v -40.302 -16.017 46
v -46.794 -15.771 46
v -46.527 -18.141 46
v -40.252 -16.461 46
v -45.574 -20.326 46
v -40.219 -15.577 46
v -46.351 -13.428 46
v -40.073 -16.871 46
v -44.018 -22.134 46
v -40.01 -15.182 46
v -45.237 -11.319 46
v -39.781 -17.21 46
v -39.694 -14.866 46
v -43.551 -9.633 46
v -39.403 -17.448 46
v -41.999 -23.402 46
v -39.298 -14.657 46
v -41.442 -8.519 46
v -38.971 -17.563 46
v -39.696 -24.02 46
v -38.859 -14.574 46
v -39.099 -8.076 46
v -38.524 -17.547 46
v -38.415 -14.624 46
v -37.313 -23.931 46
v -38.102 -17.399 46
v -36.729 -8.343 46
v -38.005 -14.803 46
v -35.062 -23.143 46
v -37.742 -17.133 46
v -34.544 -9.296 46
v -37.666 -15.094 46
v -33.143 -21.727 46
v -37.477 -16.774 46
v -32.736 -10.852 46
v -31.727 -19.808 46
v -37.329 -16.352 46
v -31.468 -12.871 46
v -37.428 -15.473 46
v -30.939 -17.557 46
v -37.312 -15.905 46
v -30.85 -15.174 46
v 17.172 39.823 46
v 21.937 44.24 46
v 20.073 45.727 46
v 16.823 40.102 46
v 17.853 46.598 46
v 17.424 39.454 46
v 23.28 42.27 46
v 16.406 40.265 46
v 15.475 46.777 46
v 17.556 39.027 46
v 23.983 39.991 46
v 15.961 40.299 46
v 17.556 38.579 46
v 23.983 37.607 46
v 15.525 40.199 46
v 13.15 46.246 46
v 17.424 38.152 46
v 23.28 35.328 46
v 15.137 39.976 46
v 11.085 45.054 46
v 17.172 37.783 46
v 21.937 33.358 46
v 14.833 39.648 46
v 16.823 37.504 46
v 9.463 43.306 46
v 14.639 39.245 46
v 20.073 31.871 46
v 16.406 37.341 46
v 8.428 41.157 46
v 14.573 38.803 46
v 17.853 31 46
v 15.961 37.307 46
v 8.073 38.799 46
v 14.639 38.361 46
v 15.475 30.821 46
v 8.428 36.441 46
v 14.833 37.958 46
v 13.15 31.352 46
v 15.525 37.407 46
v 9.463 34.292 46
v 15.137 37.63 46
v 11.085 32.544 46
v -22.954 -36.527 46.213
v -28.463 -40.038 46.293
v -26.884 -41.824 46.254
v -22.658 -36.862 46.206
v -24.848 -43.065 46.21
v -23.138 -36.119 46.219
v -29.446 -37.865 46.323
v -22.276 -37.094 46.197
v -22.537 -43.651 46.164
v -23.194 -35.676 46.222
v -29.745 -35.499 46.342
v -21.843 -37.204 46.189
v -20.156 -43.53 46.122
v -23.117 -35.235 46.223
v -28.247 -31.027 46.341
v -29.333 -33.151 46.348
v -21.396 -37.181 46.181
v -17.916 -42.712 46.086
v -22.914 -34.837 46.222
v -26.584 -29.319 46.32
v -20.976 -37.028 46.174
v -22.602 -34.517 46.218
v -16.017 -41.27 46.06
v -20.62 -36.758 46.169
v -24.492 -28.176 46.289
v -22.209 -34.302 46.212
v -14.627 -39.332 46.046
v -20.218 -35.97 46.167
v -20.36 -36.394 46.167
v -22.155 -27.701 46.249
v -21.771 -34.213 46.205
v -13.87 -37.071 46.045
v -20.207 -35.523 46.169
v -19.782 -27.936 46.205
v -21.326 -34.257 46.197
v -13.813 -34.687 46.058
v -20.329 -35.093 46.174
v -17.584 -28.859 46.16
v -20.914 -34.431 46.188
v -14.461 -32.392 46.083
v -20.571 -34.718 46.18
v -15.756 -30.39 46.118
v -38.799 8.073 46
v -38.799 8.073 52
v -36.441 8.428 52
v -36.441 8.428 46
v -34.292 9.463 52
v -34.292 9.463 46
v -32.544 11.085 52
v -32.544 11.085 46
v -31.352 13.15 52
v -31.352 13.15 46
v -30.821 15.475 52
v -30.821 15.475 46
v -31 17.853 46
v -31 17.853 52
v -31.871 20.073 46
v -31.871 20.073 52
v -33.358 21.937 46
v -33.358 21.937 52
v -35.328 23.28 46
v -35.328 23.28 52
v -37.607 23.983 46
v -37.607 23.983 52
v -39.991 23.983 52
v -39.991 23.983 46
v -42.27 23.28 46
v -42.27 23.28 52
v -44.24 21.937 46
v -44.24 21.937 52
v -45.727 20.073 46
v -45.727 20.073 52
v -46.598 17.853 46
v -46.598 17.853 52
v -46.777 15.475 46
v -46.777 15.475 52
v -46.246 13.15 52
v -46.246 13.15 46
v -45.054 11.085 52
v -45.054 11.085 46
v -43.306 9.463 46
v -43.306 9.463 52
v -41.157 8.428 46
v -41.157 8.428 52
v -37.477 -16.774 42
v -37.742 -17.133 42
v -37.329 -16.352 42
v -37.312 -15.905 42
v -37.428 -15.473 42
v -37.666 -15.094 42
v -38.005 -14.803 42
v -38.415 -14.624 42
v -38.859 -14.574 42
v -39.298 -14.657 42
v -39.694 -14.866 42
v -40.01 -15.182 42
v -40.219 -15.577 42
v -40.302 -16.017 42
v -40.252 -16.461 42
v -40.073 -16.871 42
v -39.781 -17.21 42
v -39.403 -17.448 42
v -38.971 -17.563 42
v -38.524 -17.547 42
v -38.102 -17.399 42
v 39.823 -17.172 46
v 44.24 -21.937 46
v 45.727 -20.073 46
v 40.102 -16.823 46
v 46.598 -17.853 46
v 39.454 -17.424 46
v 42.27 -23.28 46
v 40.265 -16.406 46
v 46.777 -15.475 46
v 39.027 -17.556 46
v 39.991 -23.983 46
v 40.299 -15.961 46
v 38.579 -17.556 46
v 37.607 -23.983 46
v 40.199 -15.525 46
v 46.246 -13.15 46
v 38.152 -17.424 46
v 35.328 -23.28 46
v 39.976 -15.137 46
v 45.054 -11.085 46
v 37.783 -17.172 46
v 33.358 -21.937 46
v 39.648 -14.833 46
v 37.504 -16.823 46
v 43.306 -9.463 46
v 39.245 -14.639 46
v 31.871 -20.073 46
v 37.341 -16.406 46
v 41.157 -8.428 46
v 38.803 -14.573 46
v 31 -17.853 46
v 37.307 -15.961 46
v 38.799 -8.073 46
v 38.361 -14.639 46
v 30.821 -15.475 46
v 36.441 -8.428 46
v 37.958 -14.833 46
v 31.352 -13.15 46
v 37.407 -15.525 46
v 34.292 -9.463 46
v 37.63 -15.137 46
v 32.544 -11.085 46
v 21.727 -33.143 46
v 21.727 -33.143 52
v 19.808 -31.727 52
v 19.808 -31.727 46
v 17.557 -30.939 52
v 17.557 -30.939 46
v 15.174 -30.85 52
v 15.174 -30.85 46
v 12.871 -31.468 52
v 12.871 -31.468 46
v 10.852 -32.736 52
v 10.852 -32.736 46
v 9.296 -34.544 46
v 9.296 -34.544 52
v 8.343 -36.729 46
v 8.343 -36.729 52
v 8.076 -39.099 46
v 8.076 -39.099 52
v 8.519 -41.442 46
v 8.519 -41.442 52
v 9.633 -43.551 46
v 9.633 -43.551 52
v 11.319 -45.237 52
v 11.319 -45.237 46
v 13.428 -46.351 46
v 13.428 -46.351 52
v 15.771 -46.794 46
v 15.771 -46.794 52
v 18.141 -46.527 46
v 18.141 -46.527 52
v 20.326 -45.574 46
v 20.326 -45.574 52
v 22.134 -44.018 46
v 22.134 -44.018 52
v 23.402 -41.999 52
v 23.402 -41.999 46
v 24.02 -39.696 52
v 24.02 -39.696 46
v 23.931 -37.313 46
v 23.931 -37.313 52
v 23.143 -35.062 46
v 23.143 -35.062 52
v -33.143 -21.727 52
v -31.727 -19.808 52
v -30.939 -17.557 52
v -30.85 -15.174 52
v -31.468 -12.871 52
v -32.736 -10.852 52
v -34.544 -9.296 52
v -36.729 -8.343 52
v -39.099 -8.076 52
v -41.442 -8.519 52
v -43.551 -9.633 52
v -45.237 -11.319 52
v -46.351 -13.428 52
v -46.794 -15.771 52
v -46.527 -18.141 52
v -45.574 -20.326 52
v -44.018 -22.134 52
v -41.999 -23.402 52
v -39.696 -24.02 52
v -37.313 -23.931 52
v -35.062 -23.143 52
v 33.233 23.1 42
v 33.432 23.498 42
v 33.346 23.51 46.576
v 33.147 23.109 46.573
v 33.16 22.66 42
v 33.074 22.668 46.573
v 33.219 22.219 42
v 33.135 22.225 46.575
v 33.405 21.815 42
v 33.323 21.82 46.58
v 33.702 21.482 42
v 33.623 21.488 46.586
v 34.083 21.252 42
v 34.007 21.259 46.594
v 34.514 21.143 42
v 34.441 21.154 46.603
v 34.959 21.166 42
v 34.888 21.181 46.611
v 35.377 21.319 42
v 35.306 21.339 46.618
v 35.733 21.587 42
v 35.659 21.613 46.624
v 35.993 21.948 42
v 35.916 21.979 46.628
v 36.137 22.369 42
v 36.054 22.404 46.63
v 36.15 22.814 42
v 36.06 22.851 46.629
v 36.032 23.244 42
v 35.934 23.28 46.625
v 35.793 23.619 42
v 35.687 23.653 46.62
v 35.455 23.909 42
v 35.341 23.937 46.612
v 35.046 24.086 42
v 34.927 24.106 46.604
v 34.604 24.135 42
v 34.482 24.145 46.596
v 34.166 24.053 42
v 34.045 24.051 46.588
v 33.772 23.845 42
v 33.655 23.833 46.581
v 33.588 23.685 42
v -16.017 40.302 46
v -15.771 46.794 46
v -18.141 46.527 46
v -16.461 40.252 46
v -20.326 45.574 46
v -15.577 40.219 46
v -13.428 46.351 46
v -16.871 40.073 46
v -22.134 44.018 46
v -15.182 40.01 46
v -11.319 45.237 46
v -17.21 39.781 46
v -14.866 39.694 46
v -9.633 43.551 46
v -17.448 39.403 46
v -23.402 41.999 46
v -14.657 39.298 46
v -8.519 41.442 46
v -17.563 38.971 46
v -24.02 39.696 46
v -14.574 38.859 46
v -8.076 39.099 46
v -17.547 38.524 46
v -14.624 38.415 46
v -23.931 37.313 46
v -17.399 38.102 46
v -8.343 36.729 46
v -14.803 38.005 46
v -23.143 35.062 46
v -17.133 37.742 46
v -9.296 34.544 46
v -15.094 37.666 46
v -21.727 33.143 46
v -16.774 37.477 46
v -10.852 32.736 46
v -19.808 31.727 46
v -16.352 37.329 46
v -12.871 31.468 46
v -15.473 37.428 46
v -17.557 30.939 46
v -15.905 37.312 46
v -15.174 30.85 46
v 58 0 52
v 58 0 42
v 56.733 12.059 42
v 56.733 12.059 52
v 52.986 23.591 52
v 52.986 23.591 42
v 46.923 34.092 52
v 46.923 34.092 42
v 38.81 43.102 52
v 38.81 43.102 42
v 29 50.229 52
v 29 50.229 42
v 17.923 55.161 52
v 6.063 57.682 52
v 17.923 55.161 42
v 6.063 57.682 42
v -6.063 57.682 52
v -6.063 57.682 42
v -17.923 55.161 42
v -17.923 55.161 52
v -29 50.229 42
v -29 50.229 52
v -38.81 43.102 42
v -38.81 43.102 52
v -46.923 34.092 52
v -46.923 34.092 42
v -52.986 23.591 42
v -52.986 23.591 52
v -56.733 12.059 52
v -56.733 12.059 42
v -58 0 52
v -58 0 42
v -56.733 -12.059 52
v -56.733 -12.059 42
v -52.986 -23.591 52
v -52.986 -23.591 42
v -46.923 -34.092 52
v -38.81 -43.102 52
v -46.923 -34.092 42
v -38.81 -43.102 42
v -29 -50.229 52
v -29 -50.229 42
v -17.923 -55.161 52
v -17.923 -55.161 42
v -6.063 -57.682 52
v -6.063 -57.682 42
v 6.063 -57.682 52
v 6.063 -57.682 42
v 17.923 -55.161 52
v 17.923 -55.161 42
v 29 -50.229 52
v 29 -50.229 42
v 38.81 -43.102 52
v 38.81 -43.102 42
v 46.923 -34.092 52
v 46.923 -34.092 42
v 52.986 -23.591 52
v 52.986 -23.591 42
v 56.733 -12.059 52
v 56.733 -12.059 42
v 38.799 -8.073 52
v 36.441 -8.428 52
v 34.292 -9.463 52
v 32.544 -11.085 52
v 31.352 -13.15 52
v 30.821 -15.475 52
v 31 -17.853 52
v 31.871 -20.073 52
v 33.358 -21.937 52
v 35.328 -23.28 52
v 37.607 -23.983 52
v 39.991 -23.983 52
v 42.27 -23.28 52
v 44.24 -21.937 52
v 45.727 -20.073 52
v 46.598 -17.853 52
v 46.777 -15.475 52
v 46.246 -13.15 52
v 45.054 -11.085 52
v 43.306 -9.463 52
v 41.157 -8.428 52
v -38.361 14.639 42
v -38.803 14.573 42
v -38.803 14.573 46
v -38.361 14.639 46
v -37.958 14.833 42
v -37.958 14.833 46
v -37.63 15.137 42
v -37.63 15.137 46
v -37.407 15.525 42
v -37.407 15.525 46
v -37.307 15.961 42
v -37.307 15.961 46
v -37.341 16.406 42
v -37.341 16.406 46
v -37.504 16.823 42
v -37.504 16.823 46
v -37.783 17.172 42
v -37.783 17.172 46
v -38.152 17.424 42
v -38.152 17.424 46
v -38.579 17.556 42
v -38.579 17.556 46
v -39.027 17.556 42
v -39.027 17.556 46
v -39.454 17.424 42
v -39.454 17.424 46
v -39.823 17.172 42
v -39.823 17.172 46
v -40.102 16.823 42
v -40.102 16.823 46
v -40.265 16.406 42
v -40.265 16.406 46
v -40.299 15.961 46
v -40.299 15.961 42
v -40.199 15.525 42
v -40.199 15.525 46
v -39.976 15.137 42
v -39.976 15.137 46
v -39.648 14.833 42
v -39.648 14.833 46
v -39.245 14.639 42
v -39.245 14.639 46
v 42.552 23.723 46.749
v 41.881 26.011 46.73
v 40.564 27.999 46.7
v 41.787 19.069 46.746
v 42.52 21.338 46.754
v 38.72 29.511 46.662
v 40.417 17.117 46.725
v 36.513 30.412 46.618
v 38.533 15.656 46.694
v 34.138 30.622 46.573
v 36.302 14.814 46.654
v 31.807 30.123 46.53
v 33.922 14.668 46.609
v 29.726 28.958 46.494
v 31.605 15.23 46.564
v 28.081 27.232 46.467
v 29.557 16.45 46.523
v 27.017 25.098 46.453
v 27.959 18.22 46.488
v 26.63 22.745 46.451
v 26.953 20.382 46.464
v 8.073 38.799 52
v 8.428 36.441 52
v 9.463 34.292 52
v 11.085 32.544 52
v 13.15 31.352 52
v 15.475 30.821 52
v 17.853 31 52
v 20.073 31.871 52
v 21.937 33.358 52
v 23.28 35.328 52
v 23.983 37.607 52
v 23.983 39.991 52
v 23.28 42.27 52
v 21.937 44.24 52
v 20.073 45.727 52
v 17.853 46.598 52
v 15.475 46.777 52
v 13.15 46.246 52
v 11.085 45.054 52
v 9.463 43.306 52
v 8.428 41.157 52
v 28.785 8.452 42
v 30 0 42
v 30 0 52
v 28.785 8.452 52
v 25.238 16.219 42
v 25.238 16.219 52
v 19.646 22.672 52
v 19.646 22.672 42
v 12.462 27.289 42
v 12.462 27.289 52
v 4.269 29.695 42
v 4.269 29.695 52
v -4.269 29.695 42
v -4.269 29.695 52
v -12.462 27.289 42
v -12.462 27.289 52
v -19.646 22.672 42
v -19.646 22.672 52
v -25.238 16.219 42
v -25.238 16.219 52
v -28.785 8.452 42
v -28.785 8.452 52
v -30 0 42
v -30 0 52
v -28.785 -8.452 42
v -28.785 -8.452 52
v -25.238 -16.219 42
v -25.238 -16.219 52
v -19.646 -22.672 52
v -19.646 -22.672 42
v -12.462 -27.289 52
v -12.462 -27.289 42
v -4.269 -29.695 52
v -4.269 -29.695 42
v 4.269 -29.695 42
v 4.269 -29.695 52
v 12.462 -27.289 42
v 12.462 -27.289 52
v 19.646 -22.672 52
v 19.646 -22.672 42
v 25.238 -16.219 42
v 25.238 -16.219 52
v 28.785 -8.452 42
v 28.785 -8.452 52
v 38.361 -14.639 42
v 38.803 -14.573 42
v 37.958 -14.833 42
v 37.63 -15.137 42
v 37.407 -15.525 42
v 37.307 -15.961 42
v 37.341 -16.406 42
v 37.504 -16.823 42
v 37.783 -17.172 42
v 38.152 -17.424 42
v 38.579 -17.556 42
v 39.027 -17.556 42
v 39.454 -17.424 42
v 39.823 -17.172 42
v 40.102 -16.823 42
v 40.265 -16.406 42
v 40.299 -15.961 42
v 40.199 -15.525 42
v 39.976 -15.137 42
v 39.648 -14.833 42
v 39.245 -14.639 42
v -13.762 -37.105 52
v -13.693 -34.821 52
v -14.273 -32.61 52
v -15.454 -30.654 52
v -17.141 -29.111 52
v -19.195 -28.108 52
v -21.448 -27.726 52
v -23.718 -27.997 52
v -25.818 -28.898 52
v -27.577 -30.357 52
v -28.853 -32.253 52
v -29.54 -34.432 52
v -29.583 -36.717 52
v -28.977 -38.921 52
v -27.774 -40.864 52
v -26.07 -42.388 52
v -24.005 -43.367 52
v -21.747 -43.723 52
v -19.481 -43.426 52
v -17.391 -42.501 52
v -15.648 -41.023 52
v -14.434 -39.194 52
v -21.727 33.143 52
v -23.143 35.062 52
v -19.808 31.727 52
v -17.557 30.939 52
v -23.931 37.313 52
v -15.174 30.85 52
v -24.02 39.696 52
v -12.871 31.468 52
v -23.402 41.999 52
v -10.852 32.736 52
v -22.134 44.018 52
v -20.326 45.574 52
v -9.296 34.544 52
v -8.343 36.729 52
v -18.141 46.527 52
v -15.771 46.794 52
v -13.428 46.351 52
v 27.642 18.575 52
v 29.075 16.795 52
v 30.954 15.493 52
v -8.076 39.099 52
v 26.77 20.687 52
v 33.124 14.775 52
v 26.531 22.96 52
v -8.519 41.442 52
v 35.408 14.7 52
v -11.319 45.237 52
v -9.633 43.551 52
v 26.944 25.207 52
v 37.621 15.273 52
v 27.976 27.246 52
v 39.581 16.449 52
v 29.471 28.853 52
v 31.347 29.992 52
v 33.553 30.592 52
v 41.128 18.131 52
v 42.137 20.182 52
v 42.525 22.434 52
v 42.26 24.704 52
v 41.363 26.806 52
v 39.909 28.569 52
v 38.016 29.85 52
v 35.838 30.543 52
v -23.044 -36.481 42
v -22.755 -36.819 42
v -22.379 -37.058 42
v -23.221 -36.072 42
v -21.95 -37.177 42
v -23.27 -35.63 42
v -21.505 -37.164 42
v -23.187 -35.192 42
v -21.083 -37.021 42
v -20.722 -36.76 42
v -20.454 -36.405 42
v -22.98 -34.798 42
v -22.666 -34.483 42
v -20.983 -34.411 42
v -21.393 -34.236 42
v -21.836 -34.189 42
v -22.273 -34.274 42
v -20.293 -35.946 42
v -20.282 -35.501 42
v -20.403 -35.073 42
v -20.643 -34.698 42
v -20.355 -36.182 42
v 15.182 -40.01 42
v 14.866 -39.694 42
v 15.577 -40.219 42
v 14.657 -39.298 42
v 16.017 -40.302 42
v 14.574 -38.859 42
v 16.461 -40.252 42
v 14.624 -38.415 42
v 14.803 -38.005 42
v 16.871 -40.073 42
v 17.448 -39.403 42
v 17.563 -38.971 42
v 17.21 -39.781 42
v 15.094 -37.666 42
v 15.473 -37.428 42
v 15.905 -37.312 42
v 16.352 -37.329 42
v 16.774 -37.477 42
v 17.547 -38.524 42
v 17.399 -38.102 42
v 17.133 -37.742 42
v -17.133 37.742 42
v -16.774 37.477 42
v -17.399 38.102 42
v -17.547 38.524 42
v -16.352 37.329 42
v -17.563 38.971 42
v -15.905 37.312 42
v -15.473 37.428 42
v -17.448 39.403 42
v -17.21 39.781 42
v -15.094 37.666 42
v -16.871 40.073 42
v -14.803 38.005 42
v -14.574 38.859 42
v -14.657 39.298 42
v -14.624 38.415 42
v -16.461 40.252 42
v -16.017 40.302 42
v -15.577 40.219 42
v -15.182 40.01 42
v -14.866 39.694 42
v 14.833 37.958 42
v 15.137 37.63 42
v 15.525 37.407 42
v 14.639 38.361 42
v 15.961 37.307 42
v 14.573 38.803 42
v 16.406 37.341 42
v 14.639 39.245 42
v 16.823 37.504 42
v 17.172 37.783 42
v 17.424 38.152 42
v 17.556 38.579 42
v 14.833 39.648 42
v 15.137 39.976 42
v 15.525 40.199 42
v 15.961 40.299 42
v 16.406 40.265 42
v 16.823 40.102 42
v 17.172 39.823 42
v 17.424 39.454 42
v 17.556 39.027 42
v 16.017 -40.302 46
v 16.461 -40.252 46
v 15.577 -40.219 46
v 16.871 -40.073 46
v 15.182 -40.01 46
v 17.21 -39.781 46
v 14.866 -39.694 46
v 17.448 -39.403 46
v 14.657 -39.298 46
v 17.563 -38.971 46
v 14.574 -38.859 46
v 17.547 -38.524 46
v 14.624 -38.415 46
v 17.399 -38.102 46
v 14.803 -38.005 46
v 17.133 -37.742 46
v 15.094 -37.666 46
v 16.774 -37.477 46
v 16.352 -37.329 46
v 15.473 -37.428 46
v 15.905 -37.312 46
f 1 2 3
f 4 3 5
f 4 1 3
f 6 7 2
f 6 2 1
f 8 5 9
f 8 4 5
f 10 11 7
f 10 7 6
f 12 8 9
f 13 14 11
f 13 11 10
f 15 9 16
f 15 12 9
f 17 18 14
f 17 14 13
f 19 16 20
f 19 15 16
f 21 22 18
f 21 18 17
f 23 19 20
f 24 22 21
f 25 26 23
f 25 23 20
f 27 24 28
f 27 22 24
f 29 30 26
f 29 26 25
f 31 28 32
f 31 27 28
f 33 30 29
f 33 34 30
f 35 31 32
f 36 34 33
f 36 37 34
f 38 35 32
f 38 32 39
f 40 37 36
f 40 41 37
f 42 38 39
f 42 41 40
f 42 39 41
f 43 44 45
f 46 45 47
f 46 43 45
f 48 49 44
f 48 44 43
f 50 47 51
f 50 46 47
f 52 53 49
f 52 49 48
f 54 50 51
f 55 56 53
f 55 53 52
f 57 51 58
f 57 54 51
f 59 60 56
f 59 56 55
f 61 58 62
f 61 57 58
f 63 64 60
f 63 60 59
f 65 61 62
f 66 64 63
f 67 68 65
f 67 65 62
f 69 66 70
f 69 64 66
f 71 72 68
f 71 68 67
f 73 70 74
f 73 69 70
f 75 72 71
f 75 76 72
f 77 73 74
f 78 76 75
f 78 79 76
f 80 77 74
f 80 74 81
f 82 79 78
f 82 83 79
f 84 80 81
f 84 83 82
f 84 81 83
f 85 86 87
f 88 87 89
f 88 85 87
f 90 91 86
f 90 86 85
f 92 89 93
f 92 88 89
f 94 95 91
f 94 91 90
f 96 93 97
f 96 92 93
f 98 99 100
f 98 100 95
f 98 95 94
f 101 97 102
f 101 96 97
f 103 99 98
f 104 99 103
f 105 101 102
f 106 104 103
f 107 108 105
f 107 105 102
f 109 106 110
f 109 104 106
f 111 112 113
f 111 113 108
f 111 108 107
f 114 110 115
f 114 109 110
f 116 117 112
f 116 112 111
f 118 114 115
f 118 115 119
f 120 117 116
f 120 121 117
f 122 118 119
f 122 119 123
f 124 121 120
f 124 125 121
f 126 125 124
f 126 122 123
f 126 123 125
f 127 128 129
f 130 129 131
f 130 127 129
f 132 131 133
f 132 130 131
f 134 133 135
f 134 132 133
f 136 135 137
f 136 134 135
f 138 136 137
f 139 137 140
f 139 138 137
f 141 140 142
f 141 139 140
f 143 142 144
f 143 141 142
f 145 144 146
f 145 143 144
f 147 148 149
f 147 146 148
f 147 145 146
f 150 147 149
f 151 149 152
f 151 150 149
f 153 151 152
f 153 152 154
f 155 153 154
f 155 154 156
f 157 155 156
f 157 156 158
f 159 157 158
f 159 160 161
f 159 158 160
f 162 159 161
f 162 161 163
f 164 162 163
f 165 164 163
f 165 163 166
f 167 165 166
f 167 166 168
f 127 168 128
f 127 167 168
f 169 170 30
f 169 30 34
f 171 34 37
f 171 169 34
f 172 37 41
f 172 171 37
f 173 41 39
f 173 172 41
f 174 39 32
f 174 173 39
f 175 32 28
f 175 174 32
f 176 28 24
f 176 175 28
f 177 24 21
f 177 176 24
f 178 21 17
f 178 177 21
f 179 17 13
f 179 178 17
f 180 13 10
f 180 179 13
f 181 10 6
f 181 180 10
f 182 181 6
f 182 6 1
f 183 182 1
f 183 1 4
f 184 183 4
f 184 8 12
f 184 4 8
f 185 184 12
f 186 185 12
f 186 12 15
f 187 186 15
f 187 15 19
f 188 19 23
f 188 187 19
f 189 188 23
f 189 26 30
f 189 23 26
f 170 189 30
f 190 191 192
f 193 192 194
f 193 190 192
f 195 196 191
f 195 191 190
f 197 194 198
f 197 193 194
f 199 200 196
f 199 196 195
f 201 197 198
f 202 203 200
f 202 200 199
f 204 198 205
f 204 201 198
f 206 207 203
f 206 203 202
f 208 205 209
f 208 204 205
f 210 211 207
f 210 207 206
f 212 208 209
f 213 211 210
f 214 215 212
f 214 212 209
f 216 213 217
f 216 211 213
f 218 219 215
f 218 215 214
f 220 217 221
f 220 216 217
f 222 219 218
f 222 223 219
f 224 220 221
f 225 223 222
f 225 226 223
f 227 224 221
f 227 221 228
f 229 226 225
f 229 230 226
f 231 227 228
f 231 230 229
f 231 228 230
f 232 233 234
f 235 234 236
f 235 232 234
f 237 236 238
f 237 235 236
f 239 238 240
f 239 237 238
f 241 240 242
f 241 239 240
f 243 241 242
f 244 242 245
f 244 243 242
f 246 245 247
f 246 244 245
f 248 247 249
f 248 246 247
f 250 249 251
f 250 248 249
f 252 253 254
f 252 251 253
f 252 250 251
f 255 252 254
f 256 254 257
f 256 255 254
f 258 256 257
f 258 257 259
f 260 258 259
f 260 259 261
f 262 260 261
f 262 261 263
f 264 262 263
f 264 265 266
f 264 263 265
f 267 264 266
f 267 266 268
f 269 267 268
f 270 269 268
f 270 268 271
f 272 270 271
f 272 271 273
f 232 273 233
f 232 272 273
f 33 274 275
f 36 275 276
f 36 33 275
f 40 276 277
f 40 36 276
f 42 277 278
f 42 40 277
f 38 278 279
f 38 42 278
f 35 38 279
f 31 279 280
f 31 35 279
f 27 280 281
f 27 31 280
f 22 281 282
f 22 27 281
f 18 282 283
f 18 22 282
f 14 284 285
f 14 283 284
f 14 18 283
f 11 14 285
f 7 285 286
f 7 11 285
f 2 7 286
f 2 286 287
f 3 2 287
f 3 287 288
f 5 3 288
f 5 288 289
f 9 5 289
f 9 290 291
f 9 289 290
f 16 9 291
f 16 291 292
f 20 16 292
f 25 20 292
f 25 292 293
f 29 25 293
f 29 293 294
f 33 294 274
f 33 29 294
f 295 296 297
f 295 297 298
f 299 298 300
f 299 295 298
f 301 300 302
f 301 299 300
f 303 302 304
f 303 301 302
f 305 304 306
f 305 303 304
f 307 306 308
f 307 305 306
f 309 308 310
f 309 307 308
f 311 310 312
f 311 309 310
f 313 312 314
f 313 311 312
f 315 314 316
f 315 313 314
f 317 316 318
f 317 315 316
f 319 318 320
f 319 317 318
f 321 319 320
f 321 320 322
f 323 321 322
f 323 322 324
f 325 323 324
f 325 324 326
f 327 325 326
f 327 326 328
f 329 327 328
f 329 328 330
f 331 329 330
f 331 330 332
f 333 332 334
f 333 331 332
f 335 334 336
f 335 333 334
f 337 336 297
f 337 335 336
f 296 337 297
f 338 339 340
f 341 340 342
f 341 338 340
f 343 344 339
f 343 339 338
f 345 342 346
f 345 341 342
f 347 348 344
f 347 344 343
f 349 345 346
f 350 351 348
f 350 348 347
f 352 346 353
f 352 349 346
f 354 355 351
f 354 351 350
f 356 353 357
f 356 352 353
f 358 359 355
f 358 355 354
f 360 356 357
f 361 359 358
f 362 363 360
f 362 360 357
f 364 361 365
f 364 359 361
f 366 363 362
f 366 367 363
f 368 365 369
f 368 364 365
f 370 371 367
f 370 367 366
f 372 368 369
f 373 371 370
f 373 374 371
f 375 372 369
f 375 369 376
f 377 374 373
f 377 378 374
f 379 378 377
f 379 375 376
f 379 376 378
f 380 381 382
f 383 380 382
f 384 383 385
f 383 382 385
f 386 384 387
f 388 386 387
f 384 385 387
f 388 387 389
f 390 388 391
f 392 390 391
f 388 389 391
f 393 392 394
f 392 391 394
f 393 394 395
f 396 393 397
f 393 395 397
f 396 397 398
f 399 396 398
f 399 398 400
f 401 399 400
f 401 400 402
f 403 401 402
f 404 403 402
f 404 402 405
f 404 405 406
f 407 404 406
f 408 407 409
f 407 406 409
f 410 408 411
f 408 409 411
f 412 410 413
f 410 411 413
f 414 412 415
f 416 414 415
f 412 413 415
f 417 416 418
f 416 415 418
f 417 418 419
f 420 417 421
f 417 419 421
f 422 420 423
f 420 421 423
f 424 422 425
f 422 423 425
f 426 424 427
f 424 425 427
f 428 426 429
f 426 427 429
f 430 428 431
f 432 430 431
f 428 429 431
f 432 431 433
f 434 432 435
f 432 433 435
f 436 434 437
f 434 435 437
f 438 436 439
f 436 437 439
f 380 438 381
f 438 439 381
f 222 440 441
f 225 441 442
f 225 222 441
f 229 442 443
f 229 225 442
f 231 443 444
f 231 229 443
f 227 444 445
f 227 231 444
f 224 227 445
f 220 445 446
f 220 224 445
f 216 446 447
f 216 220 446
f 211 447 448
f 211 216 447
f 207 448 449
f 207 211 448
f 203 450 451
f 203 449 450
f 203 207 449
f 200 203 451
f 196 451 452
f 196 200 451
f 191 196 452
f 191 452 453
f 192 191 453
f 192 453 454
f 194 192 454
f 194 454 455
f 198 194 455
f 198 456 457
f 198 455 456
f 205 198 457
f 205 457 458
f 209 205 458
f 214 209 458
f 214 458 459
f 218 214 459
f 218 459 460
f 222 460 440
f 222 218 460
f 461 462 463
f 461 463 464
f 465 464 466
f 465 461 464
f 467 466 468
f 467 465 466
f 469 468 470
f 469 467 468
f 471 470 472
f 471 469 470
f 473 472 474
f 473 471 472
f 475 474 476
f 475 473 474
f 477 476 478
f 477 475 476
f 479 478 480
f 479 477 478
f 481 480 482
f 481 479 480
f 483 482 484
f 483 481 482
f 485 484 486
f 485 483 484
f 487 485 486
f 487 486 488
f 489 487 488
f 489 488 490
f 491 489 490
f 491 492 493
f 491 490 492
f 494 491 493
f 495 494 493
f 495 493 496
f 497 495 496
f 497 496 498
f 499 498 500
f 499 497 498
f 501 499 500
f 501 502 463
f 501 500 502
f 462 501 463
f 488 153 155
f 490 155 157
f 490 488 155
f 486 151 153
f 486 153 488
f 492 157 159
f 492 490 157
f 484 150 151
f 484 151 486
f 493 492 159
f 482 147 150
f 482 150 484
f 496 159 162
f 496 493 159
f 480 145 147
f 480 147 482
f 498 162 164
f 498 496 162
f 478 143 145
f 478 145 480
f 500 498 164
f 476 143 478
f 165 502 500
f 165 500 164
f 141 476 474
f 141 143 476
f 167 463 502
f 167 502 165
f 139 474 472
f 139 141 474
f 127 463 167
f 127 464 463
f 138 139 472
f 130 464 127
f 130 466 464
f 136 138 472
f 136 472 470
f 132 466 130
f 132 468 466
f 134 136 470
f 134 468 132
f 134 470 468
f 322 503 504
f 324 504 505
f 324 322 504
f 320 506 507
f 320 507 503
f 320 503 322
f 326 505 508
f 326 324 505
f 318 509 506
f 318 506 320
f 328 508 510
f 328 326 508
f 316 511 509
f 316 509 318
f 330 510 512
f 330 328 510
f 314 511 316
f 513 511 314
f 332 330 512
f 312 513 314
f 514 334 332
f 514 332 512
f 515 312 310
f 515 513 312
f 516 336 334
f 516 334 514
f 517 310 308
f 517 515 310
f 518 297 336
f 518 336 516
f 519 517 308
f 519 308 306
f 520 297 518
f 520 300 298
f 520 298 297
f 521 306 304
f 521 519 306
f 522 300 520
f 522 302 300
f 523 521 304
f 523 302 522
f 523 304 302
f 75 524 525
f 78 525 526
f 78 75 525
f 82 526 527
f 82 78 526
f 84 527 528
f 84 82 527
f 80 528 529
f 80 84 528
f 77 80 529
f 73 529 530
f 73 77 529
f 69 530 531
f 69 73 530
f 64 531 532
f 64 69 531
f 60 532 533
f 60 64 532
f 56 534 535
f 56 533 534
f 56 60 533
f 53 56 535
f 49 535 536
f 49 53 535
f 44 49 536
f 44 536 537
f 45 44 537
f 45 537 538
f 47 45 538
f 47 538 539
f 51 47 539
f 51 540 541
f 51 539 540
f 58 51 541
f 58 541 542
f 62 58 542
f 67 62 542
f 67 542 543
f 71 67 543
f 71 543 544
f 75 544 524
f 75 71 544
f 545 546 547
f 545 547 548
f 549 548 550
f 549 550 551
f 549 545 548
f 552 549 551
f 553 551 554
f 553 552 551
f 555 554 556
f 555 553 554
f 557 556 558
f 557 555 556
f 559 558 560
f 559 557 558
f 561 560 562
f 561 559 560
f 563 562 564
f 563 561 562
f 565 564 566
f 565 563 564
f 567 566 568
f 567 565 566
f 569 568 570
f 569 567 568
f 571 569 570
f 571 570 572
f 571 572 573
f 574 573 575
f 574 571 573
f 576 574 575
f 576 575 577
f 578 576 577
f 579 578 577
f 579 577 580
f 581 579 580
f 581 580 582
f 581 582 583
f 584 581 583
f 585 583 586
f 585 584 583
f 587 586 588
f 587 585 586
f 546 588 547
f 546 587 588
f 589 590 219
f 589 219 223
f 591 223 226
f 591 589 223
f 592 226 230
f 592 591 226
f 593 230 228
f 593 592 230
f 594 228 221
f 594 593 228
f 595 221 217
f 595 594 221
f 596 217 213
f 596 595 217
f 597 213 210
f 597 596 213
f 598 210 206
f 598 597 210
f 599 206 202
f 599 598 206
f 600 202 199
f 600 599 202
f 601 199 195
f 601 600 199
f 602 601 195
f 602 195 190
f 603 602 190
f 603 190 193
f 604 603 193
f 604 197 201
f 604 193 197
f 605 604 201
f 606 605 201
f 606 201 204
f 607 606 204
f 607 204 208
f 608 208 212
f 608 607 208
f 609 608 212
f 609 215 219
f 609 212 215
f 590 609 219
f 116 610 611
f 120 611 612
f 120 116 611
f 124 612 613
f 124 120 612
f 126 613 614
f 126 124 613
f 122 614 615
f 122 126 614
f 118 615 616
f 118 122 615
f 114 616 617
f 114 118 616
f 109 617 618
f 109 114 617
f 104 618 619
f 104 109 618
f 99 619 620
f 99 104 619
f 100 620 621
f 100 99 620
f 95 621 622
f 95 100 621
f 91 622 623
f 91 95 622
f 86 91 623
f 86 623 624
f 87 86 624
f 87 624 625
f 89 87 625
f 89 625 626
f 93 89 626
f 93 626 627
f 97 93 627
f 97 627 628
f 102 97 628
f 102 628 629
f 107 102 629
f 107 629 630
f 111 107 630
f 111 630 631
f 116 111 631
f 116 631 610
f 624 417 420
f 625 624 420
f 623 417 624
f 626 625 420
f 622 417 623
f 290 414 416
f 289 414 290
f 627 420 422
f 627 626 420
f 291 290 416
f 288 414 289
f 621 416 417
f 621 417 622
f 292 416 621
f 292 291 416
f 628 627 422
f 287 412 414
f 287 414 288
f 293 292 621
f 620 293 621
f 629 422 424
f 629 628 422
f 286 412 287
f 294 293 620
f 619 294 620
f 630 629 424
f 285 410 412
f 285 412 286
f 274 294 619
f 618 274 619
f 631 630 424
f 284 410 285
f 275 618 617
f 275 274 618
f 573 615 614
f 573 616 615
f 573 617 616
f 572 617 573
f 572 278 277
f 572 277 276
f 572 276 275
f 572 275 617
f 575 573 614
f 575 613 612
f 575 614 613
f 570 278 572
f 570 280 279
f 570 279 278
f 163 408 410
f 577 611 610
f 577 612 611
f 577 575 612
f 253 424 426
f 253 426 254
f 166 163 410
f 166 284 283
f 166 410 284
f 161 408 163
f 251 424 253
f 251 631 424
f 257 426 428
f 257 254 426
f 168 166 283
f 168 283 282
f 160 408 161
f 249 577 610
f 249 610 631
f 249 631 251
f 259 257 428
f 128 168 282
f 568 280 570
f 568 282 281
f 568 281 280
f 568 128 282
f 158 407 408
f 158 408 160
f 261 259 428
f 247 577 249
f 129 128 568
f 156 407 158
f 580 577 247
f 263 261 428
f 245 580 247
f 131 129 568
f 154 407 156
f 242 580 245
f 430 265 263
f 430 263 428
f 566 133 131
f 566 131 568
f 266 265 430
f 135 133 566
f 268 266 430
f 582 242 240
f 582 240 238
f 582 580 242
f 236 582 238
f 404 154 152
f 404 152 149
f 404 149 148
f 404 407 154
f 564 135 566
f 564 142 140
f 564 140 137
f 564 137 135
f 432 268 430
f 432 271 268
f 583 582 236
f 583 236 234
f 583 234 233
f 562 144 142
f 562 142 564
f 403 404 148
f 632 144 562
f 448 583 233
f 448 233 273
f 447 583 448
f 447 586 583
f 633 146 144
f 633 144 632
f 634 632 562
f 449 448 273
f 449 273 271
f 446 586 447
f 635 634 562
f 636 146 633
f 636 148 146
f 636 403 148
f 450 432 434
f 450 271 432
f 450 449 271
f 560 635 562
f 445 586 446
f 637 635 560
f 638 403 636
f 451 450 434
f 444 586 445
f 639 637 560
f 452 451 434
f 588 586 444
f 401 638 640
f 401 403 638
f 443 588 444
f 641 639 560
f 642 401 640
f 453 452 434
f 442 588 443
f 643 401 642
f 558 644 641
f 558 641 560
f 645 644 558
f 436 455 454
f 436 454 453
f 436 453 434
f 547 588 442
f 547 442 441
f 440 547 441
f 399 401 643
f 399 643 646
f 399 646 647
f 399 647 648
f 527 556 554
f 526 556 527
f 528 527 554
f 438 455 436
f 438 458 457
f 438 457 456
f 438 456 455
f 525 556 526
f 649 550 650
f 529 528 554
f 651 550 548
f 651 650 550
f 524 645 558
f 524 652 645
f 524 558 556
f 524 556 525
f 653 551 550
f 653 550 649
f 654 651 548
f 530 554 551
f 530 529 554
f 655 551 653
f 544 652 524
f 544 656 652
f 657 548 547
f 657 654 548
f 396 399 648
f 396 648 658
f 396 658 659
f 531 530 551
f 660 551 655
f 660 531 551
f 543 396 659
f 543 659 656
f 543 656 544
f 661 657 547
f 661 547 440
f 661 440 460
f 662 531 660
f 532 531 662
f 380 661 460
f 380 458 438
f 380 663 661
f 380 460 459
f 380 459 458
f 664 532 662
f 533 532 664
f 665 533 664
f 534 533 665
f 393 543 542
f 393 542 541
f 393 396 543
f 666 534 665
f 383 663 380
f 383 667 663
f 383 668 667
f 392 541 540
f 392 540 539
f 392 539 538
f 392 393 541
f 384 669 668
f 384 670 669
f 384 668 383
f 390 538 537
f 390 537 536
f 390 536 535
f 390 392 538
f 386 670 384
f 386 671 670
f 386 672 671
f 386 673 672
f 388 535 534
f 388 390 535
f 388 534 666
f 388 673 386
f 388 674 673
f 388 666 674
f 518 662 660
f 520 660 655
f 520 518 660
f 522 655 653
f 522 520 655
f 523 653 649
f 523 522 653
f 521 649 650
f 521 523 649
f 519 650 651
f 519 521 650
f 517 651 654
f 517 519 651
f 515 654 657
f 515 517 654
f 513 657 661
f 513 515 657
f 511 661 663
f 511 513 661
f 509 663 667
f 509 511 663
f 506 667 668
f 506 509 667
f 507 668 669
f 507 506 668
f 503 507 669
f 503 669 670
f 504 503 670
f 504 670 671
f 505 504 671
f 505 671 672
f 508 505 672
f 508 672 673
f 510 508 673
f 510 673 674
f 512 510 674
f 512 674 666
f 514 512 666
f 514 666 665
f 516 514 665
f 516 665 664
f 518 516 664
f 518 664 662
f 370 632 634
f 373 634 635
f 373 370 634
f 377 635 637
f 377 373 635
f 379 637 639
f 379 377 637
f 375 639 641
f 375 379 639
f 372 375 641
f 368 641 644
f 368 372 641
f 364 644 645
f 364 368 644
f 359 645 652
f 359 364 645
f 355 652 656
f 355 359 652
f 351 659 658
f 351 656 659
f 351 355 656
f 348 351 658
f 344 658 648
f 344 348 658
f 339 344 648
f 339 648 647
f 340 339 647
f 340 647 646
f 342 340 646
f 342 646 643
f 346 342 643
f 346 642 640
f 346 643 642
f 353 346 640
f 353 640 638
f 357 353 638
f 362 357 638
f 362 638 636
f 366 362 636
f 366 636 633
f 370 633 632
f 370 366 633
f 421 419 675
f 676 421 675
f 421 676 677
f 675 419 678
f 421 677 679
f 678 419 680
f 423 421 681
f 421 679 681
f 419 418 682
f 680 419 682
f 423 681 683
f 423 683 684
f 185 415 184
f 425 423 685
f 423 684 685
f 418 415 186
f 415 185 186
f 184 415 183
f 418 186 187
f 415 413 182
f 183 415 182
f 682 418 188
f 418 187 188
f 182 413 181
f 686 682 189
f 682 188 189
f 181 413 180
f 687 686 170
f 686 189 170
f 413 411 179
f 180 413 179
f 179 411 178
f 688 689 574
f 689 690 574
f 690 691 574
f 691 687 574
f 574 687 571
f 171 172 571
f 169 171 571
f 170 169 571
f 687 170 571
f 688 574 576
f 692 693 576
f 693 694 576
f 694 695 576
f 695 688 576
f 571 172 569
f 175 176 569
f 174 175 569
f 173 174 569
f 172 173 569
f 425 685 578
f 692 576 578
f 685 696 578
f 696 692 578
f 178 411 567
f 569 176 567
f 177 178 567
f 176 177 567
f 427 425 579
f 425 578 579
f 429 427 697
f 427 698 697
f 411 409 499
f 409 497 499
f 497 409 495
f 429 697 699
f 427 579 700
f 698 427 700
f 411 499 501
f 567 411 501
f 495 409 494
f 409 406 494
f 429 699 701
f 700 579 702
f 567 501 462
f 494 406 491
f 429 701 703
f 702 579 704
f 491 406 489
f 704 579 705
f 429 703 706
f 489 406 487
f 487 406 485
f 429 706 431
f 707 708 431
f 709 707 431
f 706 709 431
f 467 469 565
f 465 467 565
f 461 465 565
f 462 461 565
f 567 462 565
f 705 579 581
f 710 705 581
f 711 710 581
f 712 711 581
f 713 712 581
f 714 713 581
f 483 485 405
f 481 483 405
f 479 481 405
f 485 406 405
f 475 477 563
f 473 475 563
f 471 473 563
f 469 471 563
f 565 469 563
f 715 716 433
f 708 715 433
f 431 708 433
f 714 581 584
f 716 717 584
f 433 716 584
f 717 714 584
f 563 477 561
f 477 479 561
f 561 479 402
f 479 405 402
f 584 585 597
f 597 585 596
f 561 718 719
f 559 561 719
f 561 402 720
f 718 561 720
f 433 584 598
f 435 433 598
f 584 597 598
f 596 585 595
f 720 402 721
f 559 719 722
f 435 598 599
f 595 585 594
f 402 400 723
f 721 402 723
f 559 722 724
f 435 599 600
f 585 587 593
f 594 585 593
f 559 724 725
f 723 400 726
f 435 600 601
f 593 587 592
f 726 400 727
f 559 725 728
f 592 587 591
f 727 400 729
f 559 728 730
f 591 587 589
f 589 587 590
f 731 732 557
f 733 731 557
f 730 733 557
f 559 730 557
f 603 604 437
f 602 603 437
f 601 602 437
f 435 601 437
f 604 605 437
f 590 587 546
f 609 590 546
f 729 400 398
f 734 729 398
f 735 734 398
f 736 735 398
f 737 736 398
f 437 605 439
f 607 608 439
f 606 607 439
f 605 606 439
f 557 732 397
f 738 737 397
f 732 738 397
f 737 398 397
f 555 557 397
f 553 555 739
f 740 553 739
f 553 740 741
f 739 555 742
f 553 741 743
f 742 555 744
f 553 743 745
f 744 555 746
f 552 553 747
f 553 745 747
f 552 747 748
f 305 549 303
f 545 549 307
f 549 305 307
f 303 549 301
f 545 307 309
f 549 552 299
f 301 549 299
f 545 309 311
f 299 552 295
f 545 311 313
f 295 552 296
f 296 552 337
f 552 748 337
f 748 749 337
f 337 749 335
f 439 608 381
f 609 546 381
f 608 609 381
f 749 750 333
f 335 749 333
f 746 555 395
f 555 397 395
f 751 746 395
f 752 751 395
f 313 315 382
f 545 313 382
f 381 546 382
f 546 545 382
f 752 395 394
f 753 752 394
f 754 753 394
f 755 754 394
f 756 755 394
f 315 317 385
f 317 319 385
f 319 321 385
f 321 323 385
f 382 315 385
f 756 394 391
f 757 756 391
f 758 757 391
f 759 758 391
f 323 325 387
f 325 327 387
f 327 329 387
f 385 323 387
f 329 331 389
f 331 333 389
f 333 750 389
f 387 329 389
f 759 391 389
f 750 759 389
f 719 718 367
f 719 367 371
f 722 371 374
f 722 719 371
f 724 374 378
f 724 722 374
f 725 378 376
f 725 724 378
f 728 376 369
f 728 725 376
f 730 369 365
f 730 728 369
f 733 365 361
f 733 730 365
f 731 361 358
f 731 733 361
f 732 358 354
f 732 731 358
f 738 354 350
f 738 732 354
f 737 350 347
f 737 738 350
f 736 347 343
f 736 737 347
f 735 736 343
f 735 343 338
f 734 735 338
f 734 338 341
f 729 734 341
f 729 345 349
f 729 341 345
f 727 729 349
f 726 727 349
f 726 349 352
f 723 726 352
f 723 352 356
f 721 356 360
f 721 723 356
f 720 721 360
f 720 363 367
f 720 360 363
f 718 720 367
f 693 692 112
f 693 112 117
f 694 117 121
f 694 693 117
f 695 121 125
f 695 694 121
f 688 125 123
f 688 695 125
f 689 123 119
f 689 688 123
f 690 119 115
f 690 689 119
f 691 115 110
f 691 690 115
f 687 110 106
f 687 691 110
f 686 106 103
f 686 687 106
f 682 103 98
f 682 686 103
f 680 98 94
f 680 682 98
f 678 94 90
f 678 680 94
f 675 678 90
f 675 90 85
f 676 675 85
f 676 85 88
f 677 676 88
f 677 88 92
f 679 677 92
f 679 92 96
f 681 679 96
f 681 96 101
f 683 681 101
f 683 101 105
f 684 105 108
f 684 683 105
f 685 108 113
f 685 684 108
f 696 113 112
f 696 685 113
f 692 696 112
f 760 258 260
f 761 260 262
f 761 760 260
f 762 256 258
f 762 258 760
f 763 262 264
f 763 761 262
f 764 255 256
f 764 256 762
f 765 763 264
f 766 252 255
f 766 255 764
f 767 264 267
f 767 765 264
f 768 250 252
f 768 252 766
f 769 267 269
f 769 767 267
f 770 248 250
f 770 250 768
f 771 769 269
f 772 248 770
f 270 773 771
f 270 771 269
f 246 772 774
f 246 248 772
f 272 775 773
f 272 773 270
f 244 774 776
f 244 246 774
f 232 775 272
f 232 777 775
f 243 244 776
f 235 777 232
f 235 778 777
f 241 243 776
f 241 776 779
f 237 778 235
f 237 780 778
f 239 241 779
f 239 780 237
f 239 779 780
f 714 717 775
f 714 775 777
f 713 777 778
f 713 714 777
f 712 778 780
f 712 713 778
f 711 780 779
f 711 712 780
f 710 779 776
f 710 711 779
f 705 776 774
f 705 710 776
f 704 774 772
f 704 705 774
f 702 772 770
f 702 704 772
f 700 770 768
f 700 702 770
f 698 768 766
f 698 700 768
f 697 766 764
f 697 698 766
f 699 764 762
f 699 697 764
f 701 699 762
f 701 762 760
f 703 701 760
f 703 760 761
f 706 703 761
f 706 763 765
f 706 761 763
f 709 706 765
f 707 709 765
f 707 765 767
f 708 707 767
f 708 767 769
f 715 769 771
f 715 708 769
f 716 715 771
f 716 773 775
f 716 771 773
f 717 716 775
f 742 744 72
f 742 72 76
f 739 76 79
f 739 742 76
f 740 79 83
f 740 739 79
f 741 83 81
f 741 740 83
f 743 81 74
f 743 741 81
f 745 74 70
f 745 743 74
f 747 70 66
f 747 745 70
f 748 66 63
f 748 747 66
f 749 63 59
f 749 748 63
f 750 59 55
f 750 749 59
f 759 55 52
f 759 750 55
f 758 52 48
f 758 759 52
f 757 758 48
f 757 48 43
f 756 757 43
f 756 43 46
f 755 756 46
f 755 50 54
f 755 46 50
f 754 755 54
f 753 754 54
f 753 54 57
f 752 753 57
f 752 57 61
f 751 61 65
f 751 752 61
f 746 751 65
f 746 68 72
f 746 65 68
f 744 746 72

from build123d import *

# Parameters (mm, degrees)
CYLINDER469_R               = 1.5
CYLINDER469_DEPTH           = 100
CYLINDER472_R               = 1.5
CYLINDER472_DEPTH           = 100
CYLINDER472_ROLL_ANGLE      = -0.500355
CYLINDER472_PITCH_ANGLE     = 0.967193
CYLINDER472_PLACEMENT_ANGLE = 144.93646
CYLINDER481_R               = 1.5
CYLINDER481_DEPTH           = 100
CYLINDER476_R               = 1.5
CYLINDER476_DEPTH           = 100
CYLINDER476_PLACEMENT_ANGLE = 225
CYLINDER470_R               = 1.5
CYLINDER470_DEPTH           = 100
CYLINDER475_R               = 1.5
CYLINDER475_DEPTH           = 100
CYLINDER475_PLACEMENT_ANGLE = 45
CYLINDER479_R               = 1.5
CYLINDER479_DEPTH           = 100
CYLINDER479_ROLL_ANGLE      = 0.146073
CYLINDER479_PITCH_ANGLE     = 1.079101
CYLINDER479_PLACEMENT_ANGLE = -9.939308
CYLINDER471_R               = 1.5
CYLINDER471_DEPTH           = 100
CYLINDER471_PLACEMENT_ANGLE = 45
CYLINDER468_R               = 8
CYLINDER468_DEPTH           = 18
CYLINDER480_R               = 8
CYLINDER480_DEPTH           = 18
CYLINDER480_PLACEMENT_ANGLE = 225
CYLINDER483_R               = 8
CYLINDER483_DEPTH           = 18
CYLINDER482_R               = 8
CYLINDER482_DEPTH           = 18
CYLINDER482_ROLL_ANGLE      = -0.500355
CYLINDER482_PITCH_ANGLE     = 0.967193
CYLINDER482_PLACEMENT_ANGLE = 144.93646
CYLINDER474_R               = 8
CYLINDER474_DEPTH           = 18
CYLINDER478_R               = 8
CYLINDER478_DEPTH           = 18
CYLINDER478_PLACEMENT_ANGLE = 45
CYLINDER473_R               = 8
CYLINDER473_DEPTH           = 18
CYLINDER473_ROLL_ANGLE      = 0.146073
CYLINDER473_PITCH_ANGLE     = 1.079101
CYLINDER473_PLACEMENT_ANGLE = -9.939308
CYLINDER477_R               = 8
CYLINDER477_DEPTH           = 18
CYLINDER477_PLACEMENT_ANGLE = 45
TUBE025_R                   = 58
TUBE025_R_2                 = 30
TUBE025_DEPTH               = 10


with BuildPart() as v_lec469:
    # Cylinder469 → Cylinder469 (new body)
    with BuildSketch(Plane(origin=(38.80294, -16.072704, 0), x_dir=(0, 1, 0), z_dir=(0, 0, 1))):
        Circle(CYLINDER469_R)
    extrude(amount=CYLINDER469_DEPTH)


with BuildPart() as v_lec472:
    # Cylinder472 → Cylinder472 (new body)
    with BuildSketch(Plane.XY):
        Circle(CYLINDER472_R)
    extrude(amount=CYLINDER472_DEPTH)


with BuildPart() as v_lec472_1:
    # Cylinder472 roll: moved
    add(v_lec472.part.rotate(Axis((0, 0, 0), (1, 0, 0)), CYLINDER472_ROLL_ANGLE))


with BuildPart() as v_lec472_2:
    # Cylinder472 pitch: moved
    add(v_lec472_1.part.rotate(Axis((0, 0, 0), (0, 1, 0)), CYLINDER472_PITCH_ANGLE))


with BuildPart() as v_lec472_3:
    # Cylinder472 placement: moved
    add(v_lec472_2.part.moved(Location((35.440039, 22.530677, 0.610113))).rotate(Axis((35.440039, 22.530677, 0.610113), (0, 0, 1)), CYLINDER472_PLACEMENT_ANGLE))


with BuildPart() as v_lec481:
    # Cylinder481 → Cylinder481 (new body)
    with BuildSketch(Plane(origin=(16.072704, 38.80294, 0), x_dir=(-1, 0, 0), z_dir=(0, 0, 1))):
        Circle(CYLINDER481_R)
    extrude(amount=CYLINDER481_DEPTH)


with BuildPart() as v_lec476:
    # Cylinder476 → Cylinder476 (new body)
    with BuildSketch(Plane.XY):
        Circle(CYLINDER476_R)
    extrude(amount=CYLINDER476_DEPTH)


with BuildPart() as v_lec476_1:
    # Cylinder476 placement: moved
    add(v_lec476.part.moved(Location((-16.072704, 38.80294, 0))).rotate(Axis((-16.072704, 38.80294, 0), (0, 0, 1)), CYLINDER476_PLACEMENT_ANGLE))


with BuildPart() as v_lec470:
    # Cylinder470 → Cylinder470 (new body)
    with BuildSketch(Plane(origin=(-38.80294, 16.072704, 0), x_dir=(0, -1, 0), z_dir=(0, 0, 1))):
        Circle(CYLINDER470_R)
    extrude(amount=CYLINDER470_DEPTH)


with BuildPart() as v_lec475:
    # Cylinder475 → Cylinder475 (new body)
    with BuildSketch(Plane.XY):
        Circle(CYLINDER475_R)
    extrude(amount=CYLINDER475_DEPTH)


with BuildPart() as v_lec475_1:
    # Cylinder475 placement: moved
    add(v_lec475.part.moved(Location((-38.80294, -16.072704, 0))).rotate(Axis((-38.80294, -16.072704, 0), (0, 0, -1)), CYLINDER475_PLACEMENT_ANGLE))


with BuildPart() as v_lec479:
    # Cylinder479 → Cylinder479 (new body)
    with BuildSketch(Plane.XY):
        Circle(CYLINDER479_R)
    extrude(amount=CYLINDER479_DEPTH)


with BuildPart() as v_lec479_1:
    # Cylinder479 roll: moved
    add(v_lec479.part.rotate(Axis((0, 0, 0), (1, 0, 0)), CYLINDER479_ROLL_ANGLE))


with BuildPart() as v_lec479_2:
    # Cylinder479 pitch: moved
    add(v_lec479_1.part.rotate(Axis((0, 0, 0), (0, 1, 0)), CYLINDER479_PITCH_ANGLE))


with BuildPart() as v_lec479_3:
    # Cylinder479 placement: moved
    add(v_lec479_2.part.moved(Location((-22.528054, -35.446371, 0.203785))).rotate(Axis((-22.528054, -35.446371, 0.203785), (0, 0, 1)), CYLINDER479_PLACEMENT_ANGLE))


with BuildPart() as compound338:
    # Cylinder471 → Cylinder471 (new body)
    with BuildSketch(Plane.XY):
        Circle(CYLINDER471_R)
    extrude(amount=CYLINDER471_DEPTH)


with BuildPart() as compound338_1:
    # Cylinder471 placement: moved
    add(compound338.part.moved(Location((16.072704, -38.80294, 0))).rotate(Axis((16.072704, -38.80294, 0), (0, 0, 1)), CYLINDER471_PLACEMENT_ANGLE))

    # Compound338: union Válec469, Válec472, Válec481, Válec476, Válec470, Válec475, Válec479
    add(v_lec469.part)
    add(v_lec472_3.part)
    add(v_lec481.part)
    add(v_lec476_1.part)
    add(v_lec470.part)
    add(v_lec475_1.part)
    add(v_lec479_3.part)


with BuildPart() as v_lec468:
    # Cylinder468 → Cylinder468 (new body)
    with BuildSketch(Plane(origin=(-38.798949, 16.072537, 43), x_dir=(0, -1, 0), z_dir=(0, 0, 1))):
        Circle(CYLINDER468_R)
    extrude(amount=CYLINDER468_DEPTH)


with BuildPart() as v_lec480:
    # Cylinder480 → Cylinder480 (new body)
    with BuildSketch(Plane.XY):
        Circle(CYLINDER480_R)
    extrude(amount=CYLINDER480_DEPTH)


with BuildPart() as v_lec480_1:
    # Cylinder480 placement: moved
    add(v_lec480.part.moved(Location((-16.07, 38.8, 43))).rotate(Axis((-16.07, 38.8, 43), (0, 0, 1)), CYLINDER480_PLACEMENT_ANGLE))


with BuildPart() as v_lec483:
    # Cylinder483 → Cylinder483 (new body)
    with BuildSketch(Plane(origin=(16.072537, 38.798949, 43), x_dir=(-1, 0, 0), z_dir=(0, 0, 1))):
        Circle(CYLINDER483_R)
    extrude(amount=CYLINDER483_DEPTH)


with BuildPart() as v_lec482:
    # Cylinder482 → Cylinder482 (new body)
    with BuildSketch(Plane.XY):
        Circle(CYLINDER482_R)
    extrude(amount=CYLINDER482_DEPTH)


with BuildPart() as v_lec482_1:
    # Cylinder482 roll: moved
    add(v_lec482.part.rotate(Axis((0, 0, 0), (1, 0, 0)), CYLINDER482_ROLL_ANGLE))


with BuildPart() as v_lec482_2:
    # Cylinder482 pitch: moved
    add(v_lec482_1.part.rotate(Axis((0, 0, 0), (0, 1, 0)), CYLINDER482_PITCH_ANGLE))


with BuildPart() as v_lec482_3:
    # Cylinder482 placement: moved
    add(v_lec482_2.part.moved(Location((34.627801, 22.637113, 43.602309))).rotate(Axis((34.627801, 22.637113, 43.602309), (0, 0, 1)), CYLINDER482_PLACEMENT_ANGLE))


with BuildPart() as v_lec474:
    # Cylinder474 → Cylinder474 (new body)
    with BuildSketch(Plane(origin=(38.798949, -16.072537, 43), x_dir=(0, 1, 0), z_dir=(0, 0, 1))):
        Circle(CYLINDER474_R)
    extrude(amount=CYLINDER474_DEPTH)


with BuildPart() as v_lec478:
    # Cylinder478 → Cylinder478 (new body)
    with BuildSketch(Plane.XY):
        Circle(CYLINDER478_R)
    extrude(amount=CYLINDER478_DEPTH)


with BuildPart() as v_lec478_1:
    # Cylinder478 placement: moved
    add(v_lec478.part.moved(Location((16.07, -38.8, 43))).rotate(Axis((16.07, -38.8, 43), (0, 0, 1)), CYLINDER478_PLACEMENT_ANGLE))


with BuildPart() as v_lec473:
    # Cylinder473 → Cylinder473 (new body)
    with BuildSketch(Plane.XY):
        Circle(CYLINDER473_R)
    extrude(amount=CYLINDER473_DEPTH)


with BuildPart() as v_lec473_1:
    # Cylinder473 roll: moved
    add(v_lec473.part.rotate(Axis((0, 0, 0), (1, 0, 0)), CYLINDER473_ROLL_ANGLE))


with BuildPart() as v_lec473_2:
    # Cylinder473 pitch: moved
    add(v_lec473_1.part.rotate(Axis((0, 0, 0), (0, 1, 0)), CYLINDER473_PITCH_ANGLE))


with BuildPart() as v_lec473_3:
    # Cylinder473 placement: moved
    add(v_lec473_2.part.moved(Location((-21.748471, -35.690226, 43.196026))).rotate(Axis((-21.748471, -35.690226, 43.196026), (0, 0, 1)), CYLINDER473_PLACEMENT_ANGLE))


with BuildPart() as compound336:
    # Cylinder477 → Cylinder477 (new body)
    with BuildSketch(Plane.XY):
        Circle(CYLINDER477_R)
    extrude(amount=CYLINDER477_DEPTH)


with BuildPart() as compound336_1:
    # Cylinder477 placement: moved
    add(compound336.part.moved(Location((-38.8, -16.07, 43))).rotate(Axis((-38.8, -16.07, 43), (0, 0, -1)), CYLINDER477_PLACEMENT_ANGLE))

    # Compound336: union Válec468, Válec480, Válec483, Válec482, Válec474, Válec478, Válec473
    add(v_lec468.part)
    add(v_lec480_1.part)
    add(v_lec483.part)
    add(v_lec482_3.part)
    add(v_lec474.part)
    add(v_lec478_1.part)
    add(v_lec473_3.part)


with BuildPart() as compound336_2:
    # Compound336 placement: moved
    add(compound336_1.part.moved(Location((0, 0, 3))))


with BuildPart() as bazovina_part_f_dirovina001:
    # Tube025 → Tube025 (new body)
    with BuildSketch(Plane.XY.offset(42)):
        Circle(TUBE025_R)
        Circle(TUBE025_R_2, mode=Mode.SUBTRACT)
    extrude(amount=TUBE025_DEPTH)

    # Cut173: cut Compound336
    add(compound336_2.part, mode=Mode.SUBTRACT)

    # Cut174: cut Compound338
    add(compound338_1.part, mode=Mode.SUBTRACT)


solid = bazovina_part_f_dirovina001.part
